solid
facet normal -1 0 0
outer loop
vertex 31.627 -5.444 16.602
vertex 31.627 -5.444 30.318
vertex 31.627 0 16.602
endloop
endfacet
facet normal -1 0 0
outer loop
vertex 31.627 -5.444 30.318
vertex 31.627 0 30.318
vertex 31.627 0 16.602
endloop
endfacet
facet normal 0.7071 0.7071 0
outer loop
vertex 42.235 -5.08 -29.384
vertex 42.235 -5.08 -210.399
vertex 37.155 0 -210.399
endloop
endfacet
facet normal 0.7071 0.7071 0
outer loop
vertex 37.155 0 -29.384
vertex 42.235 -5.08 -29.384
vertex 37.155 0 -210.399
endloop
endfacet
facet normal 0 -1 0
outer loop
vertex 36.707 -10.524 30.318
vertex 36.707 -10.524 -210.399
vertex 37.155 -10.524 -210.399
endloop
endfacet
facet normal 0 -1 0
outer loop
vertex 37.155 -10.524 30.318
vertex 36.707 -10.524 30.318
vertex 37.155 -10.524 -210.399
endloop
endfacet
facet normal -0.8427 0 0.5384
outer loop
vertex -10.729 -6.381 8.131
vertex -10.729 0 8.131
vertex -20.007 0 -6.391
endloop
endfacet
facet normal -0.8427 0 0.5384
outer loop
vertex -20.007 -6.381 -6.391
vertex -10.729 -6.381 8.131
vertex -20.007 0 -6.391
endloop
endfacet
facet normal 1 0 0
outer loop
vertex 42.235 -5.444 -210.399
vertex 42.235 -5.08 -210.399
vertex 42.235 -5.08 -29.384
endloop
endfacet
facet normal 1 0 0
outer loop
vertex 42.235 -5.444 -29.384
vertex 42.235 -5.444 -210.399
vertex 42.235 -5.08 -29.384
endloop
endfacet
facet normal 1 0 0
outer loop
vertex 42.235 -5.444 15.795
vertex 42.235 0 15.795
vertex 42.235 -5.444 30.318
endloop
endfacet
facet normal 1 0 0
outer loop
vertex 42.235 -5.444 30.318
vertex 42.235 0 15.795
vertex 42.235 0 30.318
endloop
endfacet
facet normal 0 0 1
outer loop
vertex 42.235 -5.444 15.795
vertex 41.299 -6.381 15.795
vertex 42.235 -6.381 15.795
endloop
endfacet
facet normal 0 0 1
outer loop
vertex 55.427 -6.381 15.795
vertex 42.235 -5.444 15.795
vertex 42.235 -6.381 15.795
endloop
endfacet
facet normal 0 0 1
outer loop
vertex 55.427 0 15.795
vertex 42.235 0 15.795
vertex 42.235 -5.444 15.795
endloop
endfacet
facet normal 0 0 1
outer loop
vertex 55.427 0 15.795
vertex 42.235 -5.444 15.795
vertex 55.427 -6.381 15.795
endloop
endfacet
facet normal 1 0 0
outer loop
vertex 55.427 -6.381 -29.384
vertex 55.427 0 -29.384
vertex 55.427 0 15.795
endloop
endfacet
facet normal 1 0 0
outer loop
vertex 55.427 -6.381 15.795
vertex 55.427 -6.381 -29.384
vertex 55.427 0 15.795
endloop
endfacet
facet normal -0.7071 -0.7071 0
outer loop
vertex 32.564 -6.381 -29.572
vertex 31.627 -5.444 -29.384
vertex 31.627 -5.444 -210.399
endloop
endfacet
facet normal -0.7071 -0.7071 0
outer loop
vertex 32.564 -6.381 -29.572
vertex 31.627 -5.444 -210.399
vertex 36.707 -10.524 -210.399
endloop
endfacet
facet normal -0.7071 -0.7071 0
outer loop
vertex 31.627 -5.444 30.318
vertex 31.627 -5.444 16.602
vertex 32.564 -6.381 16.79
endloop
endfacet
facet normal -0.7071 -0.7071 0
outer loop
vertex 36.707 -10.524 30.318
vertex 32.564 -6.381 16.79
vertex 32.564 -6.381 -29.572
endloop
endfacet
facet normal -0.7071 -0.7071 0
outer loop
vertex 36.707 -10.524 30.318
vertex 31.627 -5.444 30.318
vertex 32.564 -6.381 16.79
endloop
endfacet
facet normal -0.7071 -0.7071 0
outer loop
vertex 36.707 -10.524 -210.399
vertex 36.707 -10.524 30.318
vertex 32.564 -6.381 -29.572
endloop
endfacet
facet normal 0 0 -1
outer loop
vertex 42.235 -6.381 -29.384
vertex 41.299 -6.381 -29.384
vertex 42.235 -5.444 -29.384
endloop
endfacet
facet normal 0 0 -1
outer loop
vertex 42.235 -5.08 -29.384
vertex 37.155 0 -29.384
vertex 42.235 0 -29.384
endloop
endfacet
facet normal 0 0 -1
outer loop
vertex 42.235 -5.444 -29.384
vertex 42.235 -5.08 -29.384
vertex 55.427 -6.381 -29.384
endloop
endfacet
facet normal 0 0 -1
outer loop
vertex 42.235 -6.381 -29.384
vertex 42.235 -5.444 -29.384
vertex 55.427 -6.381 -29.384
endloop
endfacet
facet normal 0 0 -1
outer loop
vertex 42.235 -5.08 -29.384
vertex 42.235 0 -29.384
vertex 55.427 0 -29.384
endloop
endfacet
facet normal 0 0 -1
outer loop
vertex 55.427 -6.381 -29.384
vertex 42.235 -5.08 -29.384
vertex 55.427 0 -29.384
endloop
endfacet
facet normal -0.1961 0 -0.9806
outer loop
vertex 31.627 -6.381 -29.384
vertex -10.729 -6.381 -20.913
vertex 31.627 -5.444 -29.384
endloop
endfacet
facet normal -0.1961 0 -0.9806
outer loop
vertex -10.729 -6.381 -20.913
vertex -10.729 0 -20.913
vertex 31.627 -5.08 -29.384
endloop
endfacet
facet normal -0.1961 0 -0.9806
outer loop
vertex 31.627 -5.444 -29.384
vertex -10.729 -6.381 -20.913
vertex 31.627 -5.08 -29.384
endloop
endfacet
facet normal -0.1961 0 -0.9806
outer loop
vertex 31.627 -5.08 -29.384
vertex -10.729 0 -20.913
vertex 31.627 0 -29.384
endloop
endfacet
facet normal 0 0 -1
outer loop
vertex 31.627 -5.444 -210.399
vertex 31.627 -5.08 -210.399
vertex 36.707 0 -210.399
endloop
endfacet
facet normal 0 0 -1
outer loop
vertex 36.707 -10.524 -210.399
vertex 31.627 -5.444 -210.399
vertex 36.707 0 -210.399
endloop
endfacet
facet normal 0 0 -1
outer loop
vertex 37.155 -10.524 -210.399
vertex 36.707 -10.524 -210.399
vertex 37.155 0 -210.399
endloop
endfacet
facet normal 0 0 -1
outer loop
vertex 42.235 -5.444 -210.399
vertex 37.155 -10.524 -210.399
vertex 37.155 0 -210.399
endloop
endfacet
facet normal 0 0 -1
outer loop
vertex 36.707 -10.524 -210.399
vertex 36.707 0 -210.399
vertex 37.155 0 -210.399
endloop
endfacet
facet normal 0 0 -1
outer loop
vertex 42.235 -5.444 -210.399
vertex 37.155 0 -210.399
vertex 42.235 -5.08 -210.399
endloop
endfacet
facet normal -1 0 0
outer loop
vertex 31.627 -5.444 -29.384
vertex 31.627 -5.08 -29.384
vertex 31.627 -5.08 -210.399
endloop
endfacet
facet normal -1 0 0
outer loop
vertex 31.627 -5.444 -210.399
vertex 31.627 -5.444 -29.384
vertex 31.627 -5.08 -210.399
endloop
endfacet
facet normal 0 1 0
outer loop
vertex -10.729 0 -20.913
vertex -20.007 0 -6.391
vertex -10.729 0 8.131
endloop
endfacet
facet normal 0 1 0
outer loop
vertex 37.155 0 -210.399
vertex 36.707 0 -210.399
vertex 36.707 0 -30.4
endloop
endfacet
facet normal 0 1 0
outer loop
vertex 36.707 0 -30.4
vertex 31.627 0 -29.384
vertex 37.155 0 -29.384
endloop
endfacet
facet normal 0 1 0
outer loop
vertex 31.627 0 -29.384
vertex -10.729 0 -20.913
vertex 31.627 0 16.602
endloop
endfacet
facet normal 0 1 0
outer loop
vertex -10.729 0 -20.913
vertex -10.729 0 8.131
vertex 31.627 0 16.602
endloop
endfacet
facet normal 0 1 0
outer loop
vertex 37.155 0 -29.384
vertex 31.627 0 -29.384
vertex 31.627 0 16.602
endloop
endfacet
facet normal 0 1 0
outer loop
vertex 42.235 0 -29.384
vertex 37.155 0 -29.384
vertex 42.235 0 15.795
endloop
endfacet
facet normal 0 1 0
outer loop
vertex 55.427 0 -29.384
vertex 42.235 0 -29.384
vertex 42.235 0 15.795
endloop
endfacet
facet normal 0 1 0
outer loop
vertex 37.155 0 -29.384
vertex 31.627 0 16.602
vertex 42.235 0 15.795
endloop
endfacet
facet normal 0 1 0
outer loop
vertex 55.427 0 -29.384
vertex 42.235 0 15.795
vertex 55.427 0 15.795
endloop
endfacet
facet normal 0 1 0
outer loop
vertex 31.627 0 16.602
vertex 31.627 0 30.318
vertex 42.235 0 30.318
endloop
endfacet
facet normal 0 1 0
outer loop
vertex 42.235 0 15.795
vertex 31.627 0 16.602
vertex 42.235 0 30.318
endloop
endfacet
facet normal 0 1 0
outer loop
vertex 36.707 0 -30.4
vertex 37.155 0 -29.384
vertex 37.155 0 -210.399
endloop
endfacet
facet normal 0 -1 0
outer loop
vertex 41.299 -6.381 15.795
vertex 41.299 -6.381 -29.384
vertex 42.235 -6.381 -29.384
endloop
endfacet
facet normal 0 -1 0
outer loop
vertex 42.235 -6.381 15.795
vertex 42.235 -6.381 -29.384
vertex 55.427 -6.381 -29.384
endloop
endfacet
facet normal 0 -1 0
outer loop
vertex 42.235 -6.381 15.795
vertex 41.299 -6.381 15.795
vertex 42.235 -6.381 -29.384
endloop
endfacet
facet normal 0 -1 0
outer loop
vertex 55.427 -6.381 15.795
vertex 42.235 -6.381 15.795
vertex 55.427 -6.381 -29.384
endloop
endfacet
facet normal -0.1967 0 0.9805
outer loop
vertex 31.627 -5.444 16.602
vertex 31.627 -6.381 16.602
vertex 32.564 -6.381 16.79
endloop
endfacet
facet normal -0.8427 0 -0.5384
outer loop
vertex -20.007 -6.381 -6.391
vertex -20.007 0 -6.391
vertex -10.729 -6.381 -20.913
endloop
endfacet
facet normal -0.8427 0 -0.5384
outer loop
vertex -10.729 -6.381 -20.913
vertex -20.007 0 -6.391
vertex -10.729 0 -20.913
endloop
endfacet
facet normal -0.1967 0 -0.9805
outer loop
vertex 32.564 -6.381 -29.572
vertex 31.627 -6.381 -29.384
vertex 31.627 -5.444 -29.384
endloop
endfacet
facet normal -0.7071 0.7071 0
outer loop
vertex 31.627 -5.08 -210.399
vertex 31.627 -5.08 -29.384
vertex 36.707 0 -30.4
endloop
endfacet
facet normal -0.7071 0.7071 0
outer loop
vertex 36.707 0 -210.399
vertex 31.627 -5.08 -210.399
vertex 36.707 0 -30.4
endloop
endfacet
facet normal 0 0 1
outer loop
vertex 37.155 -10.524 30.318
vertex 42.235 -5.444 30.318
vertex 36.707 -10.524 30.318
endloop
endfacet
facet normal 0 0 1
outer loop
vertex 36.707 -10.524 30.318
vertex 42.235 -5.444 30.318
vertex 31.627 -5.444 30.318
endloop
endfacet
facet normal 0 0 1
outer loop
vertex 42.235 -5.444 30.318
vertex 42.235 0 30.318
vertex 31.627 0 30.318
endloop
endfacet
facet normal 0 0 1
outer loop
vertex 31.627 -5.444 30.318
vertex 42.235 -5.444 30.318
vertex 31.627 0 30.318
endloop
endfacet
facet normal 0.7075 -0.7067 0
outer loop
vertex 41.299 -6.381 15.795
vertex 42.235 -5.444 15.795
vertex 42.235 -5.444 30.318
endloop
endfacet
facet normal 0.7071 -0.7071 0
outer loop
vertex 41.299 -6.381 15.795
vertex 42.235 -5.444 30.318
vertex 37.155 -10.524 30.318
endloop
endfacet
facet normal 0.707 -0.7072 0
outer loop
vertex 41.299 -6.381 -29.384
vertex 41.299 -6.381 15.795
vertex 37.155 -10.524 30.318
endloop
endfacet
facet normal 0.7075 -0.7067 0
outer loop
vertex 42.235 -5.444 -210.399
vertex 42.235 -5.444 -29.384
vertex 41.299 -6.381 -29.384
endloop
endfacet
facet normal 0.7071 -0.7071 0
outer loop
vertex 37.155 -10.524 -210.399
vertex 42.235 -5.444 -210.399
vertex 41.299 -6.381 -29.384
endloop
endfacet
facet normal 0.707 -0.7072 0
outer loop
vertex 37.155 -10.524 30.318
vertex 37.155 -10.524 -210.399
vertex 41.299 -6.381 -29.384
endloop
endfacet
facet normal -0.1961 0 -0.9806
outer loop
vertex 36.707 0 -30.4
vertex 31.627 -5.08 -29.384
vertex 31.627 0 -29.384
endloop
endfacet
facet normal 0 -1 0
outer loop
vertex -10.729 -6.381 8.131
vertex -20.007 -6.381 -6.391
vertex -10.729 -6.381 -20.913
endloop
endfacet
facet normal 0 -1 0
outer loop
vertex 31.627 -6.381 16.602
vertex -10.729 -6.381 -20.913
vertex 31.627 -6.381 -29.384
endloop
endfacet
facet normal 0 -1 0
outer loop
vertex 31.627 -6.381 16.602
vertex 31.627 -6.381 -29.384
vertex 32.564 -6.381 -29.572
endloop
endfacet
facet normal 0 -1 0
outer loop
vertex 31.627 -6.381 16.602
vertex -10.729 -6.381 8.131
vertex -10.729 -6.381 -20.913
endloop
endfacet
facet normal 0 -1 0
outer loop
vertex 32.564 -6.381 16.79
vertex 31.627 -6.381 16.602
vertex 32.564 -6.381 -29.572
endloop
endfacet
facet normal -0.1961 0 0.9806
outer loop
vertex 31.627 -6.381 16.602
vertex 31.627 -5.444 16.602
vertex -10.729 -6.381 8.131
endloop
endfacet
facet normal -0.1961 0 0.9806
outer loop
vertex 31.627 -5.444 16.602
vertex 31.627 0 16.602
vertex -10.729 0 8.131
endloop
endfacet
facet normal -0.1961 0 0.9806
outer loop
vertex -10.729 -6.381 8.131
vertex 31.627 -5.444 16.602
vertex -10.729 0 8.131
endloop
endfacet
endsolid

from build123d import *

# Parameters (mm, degrees)
F0_W         = 10.6080286205
F0_H         = 181.0148730874
F1_DEPTH     = 10.52446
F0_W_2       = 13.1920464337
F0_H_2       = 45.1798141003
F2_DEPTH     = 6.38094
F3_T1_DEPTH  = 194.0790226663
F3_T6_DEPTH  = 266.8450713117
F3_T12_DEPTH = 266.8450713117
F3_T18_DEPTH = 266.8450713117
F3_T25_DEPTH = 266.8450713117
F3_T31_DEPTH = 266.8450713117
F3_T37_DEPTH = 266.8450713117
F3_T43_DEPTH = 266.8450713117
F3_T49_DEPTH = 266.8450713117
F3_T56_DEPTH = 266.8450713117
F3_T62_DEPTH = 266.8450713117
F3_T68_DEPTH = 207.1431722451


# Not quite as in the source:
# - a fillet or chamfer that OpenCascade refuses, or shapes differently, is made with other operations: its cross-section is extruded or revolved along the edge and cut away or added


with BuildPart() as f1:
    # F0 (on Front) → F1 (new body)
    with BuildSketch(Plane.XZ):
        with Locations((36.9313266128, -119.8917590082)):
            Rectangle(F0_W, F0_H)
        Polygon((42.2353409231, 15.7954916358), (42.2353409231, 30.3175766021), (31.6273123026, 30.3175766021), (31.6273123026, 16.6022777557), align=None)
        Polygon((42.2353409231, -29.3843224645), (42.2353409231, 15.7954916358), (31.6273123026, 16.6022777557), (31.6273123026, -29.3843224645), align=None)
    extrude(amount=F1_DEPTH)

    # F0 (on Front) → F2 (join)
    with BuildSketch(Plane.XZ):
        Polygon((42.2353409231, 15.7954916358), (42.2353409231, 30.3175766021), (31.6273123026, 30.3175766021), (31.6273123026, 16.6022777557), align=None)
        with Locations((48.8313641399, -6.7944154143)):
            Rectangle(F0_W_2, F0_H_2)
        Polygon((42.2353409231, -29.3843224645), (42.2353409231, 15.7954916358), (31.6273123026, 16.6022777557), (31.6273123026, -29.3843224645), align=None)
        with Locations((36.9313266128, -119.8917590082)):
            Rectangle(F0_W, F0_H)
        Polygon((31.6273123026, -29.3843224645), (31.6273123026, 16.6022777557), (-10.7287643477, 8.1310607493), (-20.0067628175, -6.3910223544), (-10.7287643477, -20.913105458), align=None)
    extrude(amount=F2_DEPTH)

    # F3: chamfer of 5.08 on 4 edges, made by hand

    # F3_s2 → F3_t1 (cut)
    with BuildSketch(Plane.XY.offset(-223.4633451307)):
        Polygon((42.2353409231, -5.08), (37.1553409231, 0), (42.2353409231, 0), align=None)
    extrude(amount=F3_T1_DEPTH, mode=Mode.SUBTRACT)


with BuildPart() as f3_tool4:
    # F3_s5 → F3_t6 (new body)
    with BuildSketch(Plane.XY.offset(-223.4633451307)):
        Polygon((42.2353409231, -5.44446), (37.1553409231, -10.52446), (42.2353409231, -10.52446), align=None)
    extrude(amount=F3_T6_DEPTH)

    split(bisect_by=Plane.XZ.offset(6.38094), keep=Keep.BOTTOM)

    split(bisect_by=Plane.XY.offset(-29.3843224645), keep=Keep.BOTTOM)


with BuildPart() as f1_1:
    add(f1.part)

    # F3_t3: cut F3_tool4
    add(f3_tool4.part, mode=Mode.SUBTRACT)


with BuildPart() as f3_tool10:
    # F3_s11 → F3_t12 (new body)
    with BuildSketch(Plane.XY.offset(-223.4633451307)):
        Polygon((42.2353409231, -5.44446), (37.1553409231, -10.52446), (42.2353409231, -10.52446), align=None)
    extrude(amount=F3_T12_DEPTH)

    split(bisect_by=Plane.XZ.offset(6.38094), keep=Keep.TOP)

    split(bisect_by=Plane.XY.offset(-29.3843224645), keep=Keep.BOTTOM)


with BuildPart() as f1_2:
    add(f1_1.part)

    # F3_t9: cut F3_tool10
    add(f3_tool10.part, mode=Mode.SUBTRACT)


with BuildPart() as f3_tool16:
    # F3_s17 → F3_t18 (new body)
    with BuildSketch(Plane.XY.offset(-223.4633451307)):
        Polygon((42.2353409231, -5.44446), (37.1553409231, -10.52446), (42.2353409231, -10.52446), align=None)
    extrude(amount=F3_T18_DEPTH)

    split(bisect_by=Plane.XY.offset(15.7954916358), keep=Keep.BOTTOM)

    split(bisect_by=Plane.XZ.offset(6.38094), keep=Keep.TOP)

    split(bisect_by=Plane.XY.offset(-29.3843224645), keep=Keep.TOP)


with BuildPart() as f1_3:
    add(f1_2.part)

    # F3_t15: cut F3_tool16
    add(f3_tool16.part, mode=Mode.SUBTRACT)


with BuildPart() as f3_tool23:
    # F3_s24 → F3_t25 (new body)
    with BuildSketch(Plane.XY.offset(-223.4633451307)):
        Polygon((42.2353409231, -5.44446), (37.1553409231, -10.52446), (42.2353409231, -10.52446), align=None)
    extrude(amount=F3_T25_DEPTH)

    split(bisect_by=Plane.XY.offset(15.7954916358), keep=Keep.TOP)

    split(bisect_by=Plane.XZ.offset(6.38094), keep=Keep.BOTTOM)


with BuildPart() as f1_4:
    add(f1_3.part)

    # F3_t22: cut F3_tool23
    add(f3_tool23.part, mode=Mode.SUBTRACT)


with BuildPart() as f3_tool29:
    # F3_s30 → F3_t31 (new body)
    with BuildSketch(Plane.XY.offset(-223.4633451307)):
        Polygon((42.2353409231, -5.44446), (37.1553409231, -10.52446), (42.2353409231, -10.52446), align=None)
    extrude(amount=F3_T31_DEPTH)

    split(bisect_by=Plane.XY.offset(15.7954916358), keep=Keep.TOP)

    split(bisect_by=Plane.XZ.offset(6.38094), keep=Keep.TOP)


with BuildPart() as f1_5:
    add(f1_4.part)

    # F3_t28: cut F3_tool29
    add(f3_tool29.part, mode=Mode.SUBTRACT)


with BuildPart() as f3_tool35:
    # F3_s36 → F3_t37 (new body)
    with BuildSketch(Plane.XY.offset(43.381726181)):
        Polygon((31.6273123026, -5.44446), (36.7073123026, -10.52446), (31.6273123026, -10.52446), align=None)
    extrude(amount=-F3_T37_DEPTH)

    split(bisect_by=Plane.XZ.offset(6.38094), keep=Keep.BOTTOM)

    split(bisect_by=Plane(origin=(-1.976310754, 0, 9.8815518144), x_dir=(0, 1, 0), z_dir=(-0.1961161725, 0, 0.9805806682)), keep=Keep.TOP)


with BuildPart() as f1_6:
    add(f1_5.part)

    # F3_t34: cut F3_tool35
    add(f3_tool35.part, mode=Mode.SUBTRACT)


with BuildPart() as f3_tool41:
    # F3_s42 → F3_t43 (new body)
    with BuildSketch(Plane.XY.offset(43.381726181)):
        Polygon((31.6273123026, -5.44446), (36.7073123026, -10.52446), (31.6273123026, -10.52446), align=None)
    extrude(amount=-F3_T43_DEPTH)

    split(bisect_by=Plane.XZ.offset(6.38094), keep=Keep.TOP)

    split(bisect_by=Plane(origin=(-1.976310754, 0, 9.8815518144), x_dir=(0, 1, 0), z_dir=(-0.1961161725, 0, 0.9805806682)), keep=Keep.TOP)


with BuildPart() as f1_7:
    add(f1_6.part)

    # F3_t40: cut F3_tool41
    add(f3_tool41.part, mode=Mode.SUBTRACT)


with BuildPart() as f3_tool47:
    # F3_s48 → F3_t49 (new body)
    with BuildSketch(Plane.XY.offset(43.381726181)):
        Polygon((31.6273123026, -5.44446), (36.7073123026, -10.52446), (31.6273123026, -10.52446), align=None)
    extrude(amount=-F3_T49_DEPTH)

    split(bisect_by=Plane(origin=(-4.4343967239, 0, -22.1719792319), x_dir=(0, 1, 0), z_dir=(0.1961161725, 0, 0.9805806682)), keep=Keep.TOP)

    split(bisect_by=Plane.XZ.offset(6.38094), keep=Keep.TOP)

    split(bisect_by=Plane(origin=(-1.976310754, 0, 9.8815518144), x_dir=(0, 1, 0), z_dir=(0.1961161725, 0, -0.9805806682)), keep=Keep.TOP)


with BuildPart() as f1_8:
    add(f1_7.part)

    # F3_t46: cut F3_tool47
    add(f3_tool47.part, mode=Mode.SUBTRACT)


with BuildPart() as f3_tool54:
    # F3_s55 → F3_t56 (new body)
    with BuildSketch(Plane.XY.offset(43.381726181)):
        Polygon((31.6273123026, -5.44446), (36.7073123026, -10.52446), (31.6273123026, -10.52446), align=None)
    extrude(amount=-F3_T56_DEPTH)

    split(bisect_by=Plane(origin=(-4.4343967239, 0, -22.1719792319), x_dir=(0, 1, 0), z_dir=(-0.1961161725, 0, -0.9805806682)), keep=Keep.TOP)

    split(bisect_by=Plane.XZ.offset(6.38094), keep=Keep.BOTTOM)


with BuildPart() as f1_9:
    add(f1_8.part)

    # F3_t53: cut F3_tool54
    add(f3_tool54.part, mode=Mode.SUBTRACT)


with BuildPart() as f3_tool60:
    # F3_s61 → F3_t62 (new body)
    with BuildSketch(Plane.XY.offset(43.381726181)):
        Polygon((31.6273123026, -5.44446), (36.7073123026, -10.52446), (31.6273123026, -10.52446), align=None)
    extrude(amount=-F3_T62_DEPTH)

    split(bisect_by=Plane(origin=(-4.4343967239, 0, -22.1719792319), x_dir=(0, 1, 0), z_dir=(-0.1961161725, 0, -0.9805806682)), keep=Keep.TOP)

    split(bisect_by=Plane.XZ.offset(6.38094), keep=Keep.TOP)


with BuildPart() as f1_10:
    add(f1_9.part)

    # F3_t59: cut F3_tool60
    add(f3_tool60.part, mode=Mode.SUBTRACT)


with BuildPart() as f3_tool66:
    # F3_s67 → F3_t68 (new body)
    with BuildSketch(Plane.XY.offset(-16.3201728856)):
        Polygon((31.6273123026, -5.08), (36.7073123026, 0), (31.6273123026, 0), align=None)
    extrude(amount=-F3_T68_DEPTH)

    split(bisect_by=Plane(origin=(-4.4343967239, 0, -22.1719792319), x_dir=(0, 1, 0), z_dir=(-0.1961161725, 0, -0.9805806682)), keep=Keep.TOP)


with BuildPart() as f1_11:
    add(f1_10.part)

    # F3_t65: cut F3_tool66
    add(f3_tool66.part, mode=Mode.SUBTRACT)


solid = f1_11.part
